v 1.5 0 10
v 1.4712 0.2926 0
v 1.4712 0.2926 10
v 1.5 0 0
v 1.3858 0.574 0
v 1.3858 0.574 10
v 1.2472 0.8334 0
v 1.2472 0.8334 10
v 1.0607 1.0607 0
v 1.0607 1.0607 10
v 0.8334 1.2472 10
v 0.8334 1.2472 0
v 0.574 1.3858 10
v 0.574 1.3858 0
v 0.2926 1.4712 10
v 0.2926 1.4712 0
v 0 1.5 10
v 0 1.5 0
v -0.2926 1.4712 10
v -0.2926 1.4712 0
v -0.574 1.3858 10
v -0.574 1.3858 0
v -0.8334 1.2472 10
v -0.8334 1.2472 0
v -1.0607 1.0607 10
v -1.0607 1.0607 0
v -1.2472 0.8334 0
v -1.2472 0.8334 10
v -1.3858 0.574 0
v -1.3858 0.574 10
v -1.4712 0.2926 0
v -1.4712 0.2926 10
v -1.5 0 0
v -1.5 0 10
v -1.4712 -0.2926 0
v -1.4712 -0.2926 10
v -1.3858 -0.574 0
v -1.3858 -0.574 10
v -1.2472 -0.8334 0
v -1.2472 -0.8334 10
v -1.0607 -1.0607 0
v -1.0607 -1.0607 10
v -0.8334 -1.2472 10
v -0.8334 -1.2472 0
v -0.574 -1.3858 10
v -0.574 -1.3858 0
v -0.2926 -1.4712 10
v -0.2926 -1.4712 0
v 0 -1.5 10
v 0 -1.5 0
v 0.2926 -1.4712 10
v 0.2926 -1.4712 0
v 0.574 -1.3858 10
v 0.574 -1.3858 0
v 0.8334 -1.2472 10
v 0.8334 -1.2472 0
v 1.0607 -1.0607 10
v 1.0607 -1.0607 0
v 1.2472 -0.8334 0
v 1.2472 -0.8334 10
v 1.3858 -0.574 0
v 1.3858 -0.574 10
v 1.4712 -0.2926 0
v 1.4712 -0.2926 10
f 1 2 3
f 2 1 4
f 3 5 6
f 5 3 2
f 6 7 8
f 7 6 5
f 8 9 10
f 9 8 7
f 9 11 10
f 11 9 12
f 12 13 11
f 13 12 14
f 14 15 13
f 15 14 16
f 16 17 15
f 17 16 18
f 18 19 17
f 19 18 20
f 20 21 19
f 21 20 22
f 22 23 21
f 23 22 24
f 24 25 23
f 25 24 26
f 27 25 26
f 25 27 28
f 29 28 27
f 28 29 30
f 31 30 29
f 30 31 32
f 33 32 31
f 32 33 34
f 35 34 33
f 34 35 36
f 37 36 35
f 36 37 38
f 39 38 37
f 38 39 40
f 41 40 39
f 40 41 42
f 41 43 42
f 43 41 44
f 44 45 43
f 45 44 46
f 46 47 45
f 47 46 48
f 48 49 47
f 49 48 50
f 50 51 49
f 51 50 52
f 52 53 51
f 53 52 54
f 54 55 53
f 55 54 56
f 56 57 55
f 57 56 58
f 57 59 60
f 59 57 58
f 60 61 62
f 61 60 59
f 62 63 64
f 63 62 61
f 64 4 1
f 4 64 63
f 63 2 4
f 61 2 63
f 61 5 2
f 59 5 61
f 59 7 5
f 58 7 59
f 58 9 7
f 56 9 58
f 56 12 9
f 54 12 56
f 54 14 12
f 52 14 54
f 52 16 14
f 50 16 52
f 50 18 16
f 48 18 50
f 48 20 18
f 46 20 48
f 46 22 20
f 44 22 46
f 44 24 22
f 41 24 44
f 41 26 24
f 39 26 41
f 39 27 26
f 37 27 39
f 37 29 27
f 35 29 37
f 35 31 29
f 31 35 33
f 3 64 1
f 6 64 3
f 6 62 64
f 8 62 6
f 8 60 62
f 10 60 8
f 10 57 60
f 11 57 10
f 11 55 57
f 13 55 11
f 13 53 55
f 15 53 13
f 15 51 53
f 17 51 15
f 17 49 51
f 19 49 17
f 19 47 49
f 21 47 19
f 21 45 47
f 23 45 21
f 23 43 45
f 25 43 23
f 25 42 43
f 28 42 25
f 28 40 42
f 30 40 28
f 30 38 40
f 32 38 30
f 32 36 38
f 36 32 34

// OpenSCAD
screw_length = 10;
hot_insert_length = 4;
hot_insert_diameter = 3;
support_diameter = hot_insert_diameter + 4;

module hot_insert_support(support_height) {
    cylinder(h=support_height, r=hot_insert_diameter/2, $fn=32);
}

hot_insert_support(10);
